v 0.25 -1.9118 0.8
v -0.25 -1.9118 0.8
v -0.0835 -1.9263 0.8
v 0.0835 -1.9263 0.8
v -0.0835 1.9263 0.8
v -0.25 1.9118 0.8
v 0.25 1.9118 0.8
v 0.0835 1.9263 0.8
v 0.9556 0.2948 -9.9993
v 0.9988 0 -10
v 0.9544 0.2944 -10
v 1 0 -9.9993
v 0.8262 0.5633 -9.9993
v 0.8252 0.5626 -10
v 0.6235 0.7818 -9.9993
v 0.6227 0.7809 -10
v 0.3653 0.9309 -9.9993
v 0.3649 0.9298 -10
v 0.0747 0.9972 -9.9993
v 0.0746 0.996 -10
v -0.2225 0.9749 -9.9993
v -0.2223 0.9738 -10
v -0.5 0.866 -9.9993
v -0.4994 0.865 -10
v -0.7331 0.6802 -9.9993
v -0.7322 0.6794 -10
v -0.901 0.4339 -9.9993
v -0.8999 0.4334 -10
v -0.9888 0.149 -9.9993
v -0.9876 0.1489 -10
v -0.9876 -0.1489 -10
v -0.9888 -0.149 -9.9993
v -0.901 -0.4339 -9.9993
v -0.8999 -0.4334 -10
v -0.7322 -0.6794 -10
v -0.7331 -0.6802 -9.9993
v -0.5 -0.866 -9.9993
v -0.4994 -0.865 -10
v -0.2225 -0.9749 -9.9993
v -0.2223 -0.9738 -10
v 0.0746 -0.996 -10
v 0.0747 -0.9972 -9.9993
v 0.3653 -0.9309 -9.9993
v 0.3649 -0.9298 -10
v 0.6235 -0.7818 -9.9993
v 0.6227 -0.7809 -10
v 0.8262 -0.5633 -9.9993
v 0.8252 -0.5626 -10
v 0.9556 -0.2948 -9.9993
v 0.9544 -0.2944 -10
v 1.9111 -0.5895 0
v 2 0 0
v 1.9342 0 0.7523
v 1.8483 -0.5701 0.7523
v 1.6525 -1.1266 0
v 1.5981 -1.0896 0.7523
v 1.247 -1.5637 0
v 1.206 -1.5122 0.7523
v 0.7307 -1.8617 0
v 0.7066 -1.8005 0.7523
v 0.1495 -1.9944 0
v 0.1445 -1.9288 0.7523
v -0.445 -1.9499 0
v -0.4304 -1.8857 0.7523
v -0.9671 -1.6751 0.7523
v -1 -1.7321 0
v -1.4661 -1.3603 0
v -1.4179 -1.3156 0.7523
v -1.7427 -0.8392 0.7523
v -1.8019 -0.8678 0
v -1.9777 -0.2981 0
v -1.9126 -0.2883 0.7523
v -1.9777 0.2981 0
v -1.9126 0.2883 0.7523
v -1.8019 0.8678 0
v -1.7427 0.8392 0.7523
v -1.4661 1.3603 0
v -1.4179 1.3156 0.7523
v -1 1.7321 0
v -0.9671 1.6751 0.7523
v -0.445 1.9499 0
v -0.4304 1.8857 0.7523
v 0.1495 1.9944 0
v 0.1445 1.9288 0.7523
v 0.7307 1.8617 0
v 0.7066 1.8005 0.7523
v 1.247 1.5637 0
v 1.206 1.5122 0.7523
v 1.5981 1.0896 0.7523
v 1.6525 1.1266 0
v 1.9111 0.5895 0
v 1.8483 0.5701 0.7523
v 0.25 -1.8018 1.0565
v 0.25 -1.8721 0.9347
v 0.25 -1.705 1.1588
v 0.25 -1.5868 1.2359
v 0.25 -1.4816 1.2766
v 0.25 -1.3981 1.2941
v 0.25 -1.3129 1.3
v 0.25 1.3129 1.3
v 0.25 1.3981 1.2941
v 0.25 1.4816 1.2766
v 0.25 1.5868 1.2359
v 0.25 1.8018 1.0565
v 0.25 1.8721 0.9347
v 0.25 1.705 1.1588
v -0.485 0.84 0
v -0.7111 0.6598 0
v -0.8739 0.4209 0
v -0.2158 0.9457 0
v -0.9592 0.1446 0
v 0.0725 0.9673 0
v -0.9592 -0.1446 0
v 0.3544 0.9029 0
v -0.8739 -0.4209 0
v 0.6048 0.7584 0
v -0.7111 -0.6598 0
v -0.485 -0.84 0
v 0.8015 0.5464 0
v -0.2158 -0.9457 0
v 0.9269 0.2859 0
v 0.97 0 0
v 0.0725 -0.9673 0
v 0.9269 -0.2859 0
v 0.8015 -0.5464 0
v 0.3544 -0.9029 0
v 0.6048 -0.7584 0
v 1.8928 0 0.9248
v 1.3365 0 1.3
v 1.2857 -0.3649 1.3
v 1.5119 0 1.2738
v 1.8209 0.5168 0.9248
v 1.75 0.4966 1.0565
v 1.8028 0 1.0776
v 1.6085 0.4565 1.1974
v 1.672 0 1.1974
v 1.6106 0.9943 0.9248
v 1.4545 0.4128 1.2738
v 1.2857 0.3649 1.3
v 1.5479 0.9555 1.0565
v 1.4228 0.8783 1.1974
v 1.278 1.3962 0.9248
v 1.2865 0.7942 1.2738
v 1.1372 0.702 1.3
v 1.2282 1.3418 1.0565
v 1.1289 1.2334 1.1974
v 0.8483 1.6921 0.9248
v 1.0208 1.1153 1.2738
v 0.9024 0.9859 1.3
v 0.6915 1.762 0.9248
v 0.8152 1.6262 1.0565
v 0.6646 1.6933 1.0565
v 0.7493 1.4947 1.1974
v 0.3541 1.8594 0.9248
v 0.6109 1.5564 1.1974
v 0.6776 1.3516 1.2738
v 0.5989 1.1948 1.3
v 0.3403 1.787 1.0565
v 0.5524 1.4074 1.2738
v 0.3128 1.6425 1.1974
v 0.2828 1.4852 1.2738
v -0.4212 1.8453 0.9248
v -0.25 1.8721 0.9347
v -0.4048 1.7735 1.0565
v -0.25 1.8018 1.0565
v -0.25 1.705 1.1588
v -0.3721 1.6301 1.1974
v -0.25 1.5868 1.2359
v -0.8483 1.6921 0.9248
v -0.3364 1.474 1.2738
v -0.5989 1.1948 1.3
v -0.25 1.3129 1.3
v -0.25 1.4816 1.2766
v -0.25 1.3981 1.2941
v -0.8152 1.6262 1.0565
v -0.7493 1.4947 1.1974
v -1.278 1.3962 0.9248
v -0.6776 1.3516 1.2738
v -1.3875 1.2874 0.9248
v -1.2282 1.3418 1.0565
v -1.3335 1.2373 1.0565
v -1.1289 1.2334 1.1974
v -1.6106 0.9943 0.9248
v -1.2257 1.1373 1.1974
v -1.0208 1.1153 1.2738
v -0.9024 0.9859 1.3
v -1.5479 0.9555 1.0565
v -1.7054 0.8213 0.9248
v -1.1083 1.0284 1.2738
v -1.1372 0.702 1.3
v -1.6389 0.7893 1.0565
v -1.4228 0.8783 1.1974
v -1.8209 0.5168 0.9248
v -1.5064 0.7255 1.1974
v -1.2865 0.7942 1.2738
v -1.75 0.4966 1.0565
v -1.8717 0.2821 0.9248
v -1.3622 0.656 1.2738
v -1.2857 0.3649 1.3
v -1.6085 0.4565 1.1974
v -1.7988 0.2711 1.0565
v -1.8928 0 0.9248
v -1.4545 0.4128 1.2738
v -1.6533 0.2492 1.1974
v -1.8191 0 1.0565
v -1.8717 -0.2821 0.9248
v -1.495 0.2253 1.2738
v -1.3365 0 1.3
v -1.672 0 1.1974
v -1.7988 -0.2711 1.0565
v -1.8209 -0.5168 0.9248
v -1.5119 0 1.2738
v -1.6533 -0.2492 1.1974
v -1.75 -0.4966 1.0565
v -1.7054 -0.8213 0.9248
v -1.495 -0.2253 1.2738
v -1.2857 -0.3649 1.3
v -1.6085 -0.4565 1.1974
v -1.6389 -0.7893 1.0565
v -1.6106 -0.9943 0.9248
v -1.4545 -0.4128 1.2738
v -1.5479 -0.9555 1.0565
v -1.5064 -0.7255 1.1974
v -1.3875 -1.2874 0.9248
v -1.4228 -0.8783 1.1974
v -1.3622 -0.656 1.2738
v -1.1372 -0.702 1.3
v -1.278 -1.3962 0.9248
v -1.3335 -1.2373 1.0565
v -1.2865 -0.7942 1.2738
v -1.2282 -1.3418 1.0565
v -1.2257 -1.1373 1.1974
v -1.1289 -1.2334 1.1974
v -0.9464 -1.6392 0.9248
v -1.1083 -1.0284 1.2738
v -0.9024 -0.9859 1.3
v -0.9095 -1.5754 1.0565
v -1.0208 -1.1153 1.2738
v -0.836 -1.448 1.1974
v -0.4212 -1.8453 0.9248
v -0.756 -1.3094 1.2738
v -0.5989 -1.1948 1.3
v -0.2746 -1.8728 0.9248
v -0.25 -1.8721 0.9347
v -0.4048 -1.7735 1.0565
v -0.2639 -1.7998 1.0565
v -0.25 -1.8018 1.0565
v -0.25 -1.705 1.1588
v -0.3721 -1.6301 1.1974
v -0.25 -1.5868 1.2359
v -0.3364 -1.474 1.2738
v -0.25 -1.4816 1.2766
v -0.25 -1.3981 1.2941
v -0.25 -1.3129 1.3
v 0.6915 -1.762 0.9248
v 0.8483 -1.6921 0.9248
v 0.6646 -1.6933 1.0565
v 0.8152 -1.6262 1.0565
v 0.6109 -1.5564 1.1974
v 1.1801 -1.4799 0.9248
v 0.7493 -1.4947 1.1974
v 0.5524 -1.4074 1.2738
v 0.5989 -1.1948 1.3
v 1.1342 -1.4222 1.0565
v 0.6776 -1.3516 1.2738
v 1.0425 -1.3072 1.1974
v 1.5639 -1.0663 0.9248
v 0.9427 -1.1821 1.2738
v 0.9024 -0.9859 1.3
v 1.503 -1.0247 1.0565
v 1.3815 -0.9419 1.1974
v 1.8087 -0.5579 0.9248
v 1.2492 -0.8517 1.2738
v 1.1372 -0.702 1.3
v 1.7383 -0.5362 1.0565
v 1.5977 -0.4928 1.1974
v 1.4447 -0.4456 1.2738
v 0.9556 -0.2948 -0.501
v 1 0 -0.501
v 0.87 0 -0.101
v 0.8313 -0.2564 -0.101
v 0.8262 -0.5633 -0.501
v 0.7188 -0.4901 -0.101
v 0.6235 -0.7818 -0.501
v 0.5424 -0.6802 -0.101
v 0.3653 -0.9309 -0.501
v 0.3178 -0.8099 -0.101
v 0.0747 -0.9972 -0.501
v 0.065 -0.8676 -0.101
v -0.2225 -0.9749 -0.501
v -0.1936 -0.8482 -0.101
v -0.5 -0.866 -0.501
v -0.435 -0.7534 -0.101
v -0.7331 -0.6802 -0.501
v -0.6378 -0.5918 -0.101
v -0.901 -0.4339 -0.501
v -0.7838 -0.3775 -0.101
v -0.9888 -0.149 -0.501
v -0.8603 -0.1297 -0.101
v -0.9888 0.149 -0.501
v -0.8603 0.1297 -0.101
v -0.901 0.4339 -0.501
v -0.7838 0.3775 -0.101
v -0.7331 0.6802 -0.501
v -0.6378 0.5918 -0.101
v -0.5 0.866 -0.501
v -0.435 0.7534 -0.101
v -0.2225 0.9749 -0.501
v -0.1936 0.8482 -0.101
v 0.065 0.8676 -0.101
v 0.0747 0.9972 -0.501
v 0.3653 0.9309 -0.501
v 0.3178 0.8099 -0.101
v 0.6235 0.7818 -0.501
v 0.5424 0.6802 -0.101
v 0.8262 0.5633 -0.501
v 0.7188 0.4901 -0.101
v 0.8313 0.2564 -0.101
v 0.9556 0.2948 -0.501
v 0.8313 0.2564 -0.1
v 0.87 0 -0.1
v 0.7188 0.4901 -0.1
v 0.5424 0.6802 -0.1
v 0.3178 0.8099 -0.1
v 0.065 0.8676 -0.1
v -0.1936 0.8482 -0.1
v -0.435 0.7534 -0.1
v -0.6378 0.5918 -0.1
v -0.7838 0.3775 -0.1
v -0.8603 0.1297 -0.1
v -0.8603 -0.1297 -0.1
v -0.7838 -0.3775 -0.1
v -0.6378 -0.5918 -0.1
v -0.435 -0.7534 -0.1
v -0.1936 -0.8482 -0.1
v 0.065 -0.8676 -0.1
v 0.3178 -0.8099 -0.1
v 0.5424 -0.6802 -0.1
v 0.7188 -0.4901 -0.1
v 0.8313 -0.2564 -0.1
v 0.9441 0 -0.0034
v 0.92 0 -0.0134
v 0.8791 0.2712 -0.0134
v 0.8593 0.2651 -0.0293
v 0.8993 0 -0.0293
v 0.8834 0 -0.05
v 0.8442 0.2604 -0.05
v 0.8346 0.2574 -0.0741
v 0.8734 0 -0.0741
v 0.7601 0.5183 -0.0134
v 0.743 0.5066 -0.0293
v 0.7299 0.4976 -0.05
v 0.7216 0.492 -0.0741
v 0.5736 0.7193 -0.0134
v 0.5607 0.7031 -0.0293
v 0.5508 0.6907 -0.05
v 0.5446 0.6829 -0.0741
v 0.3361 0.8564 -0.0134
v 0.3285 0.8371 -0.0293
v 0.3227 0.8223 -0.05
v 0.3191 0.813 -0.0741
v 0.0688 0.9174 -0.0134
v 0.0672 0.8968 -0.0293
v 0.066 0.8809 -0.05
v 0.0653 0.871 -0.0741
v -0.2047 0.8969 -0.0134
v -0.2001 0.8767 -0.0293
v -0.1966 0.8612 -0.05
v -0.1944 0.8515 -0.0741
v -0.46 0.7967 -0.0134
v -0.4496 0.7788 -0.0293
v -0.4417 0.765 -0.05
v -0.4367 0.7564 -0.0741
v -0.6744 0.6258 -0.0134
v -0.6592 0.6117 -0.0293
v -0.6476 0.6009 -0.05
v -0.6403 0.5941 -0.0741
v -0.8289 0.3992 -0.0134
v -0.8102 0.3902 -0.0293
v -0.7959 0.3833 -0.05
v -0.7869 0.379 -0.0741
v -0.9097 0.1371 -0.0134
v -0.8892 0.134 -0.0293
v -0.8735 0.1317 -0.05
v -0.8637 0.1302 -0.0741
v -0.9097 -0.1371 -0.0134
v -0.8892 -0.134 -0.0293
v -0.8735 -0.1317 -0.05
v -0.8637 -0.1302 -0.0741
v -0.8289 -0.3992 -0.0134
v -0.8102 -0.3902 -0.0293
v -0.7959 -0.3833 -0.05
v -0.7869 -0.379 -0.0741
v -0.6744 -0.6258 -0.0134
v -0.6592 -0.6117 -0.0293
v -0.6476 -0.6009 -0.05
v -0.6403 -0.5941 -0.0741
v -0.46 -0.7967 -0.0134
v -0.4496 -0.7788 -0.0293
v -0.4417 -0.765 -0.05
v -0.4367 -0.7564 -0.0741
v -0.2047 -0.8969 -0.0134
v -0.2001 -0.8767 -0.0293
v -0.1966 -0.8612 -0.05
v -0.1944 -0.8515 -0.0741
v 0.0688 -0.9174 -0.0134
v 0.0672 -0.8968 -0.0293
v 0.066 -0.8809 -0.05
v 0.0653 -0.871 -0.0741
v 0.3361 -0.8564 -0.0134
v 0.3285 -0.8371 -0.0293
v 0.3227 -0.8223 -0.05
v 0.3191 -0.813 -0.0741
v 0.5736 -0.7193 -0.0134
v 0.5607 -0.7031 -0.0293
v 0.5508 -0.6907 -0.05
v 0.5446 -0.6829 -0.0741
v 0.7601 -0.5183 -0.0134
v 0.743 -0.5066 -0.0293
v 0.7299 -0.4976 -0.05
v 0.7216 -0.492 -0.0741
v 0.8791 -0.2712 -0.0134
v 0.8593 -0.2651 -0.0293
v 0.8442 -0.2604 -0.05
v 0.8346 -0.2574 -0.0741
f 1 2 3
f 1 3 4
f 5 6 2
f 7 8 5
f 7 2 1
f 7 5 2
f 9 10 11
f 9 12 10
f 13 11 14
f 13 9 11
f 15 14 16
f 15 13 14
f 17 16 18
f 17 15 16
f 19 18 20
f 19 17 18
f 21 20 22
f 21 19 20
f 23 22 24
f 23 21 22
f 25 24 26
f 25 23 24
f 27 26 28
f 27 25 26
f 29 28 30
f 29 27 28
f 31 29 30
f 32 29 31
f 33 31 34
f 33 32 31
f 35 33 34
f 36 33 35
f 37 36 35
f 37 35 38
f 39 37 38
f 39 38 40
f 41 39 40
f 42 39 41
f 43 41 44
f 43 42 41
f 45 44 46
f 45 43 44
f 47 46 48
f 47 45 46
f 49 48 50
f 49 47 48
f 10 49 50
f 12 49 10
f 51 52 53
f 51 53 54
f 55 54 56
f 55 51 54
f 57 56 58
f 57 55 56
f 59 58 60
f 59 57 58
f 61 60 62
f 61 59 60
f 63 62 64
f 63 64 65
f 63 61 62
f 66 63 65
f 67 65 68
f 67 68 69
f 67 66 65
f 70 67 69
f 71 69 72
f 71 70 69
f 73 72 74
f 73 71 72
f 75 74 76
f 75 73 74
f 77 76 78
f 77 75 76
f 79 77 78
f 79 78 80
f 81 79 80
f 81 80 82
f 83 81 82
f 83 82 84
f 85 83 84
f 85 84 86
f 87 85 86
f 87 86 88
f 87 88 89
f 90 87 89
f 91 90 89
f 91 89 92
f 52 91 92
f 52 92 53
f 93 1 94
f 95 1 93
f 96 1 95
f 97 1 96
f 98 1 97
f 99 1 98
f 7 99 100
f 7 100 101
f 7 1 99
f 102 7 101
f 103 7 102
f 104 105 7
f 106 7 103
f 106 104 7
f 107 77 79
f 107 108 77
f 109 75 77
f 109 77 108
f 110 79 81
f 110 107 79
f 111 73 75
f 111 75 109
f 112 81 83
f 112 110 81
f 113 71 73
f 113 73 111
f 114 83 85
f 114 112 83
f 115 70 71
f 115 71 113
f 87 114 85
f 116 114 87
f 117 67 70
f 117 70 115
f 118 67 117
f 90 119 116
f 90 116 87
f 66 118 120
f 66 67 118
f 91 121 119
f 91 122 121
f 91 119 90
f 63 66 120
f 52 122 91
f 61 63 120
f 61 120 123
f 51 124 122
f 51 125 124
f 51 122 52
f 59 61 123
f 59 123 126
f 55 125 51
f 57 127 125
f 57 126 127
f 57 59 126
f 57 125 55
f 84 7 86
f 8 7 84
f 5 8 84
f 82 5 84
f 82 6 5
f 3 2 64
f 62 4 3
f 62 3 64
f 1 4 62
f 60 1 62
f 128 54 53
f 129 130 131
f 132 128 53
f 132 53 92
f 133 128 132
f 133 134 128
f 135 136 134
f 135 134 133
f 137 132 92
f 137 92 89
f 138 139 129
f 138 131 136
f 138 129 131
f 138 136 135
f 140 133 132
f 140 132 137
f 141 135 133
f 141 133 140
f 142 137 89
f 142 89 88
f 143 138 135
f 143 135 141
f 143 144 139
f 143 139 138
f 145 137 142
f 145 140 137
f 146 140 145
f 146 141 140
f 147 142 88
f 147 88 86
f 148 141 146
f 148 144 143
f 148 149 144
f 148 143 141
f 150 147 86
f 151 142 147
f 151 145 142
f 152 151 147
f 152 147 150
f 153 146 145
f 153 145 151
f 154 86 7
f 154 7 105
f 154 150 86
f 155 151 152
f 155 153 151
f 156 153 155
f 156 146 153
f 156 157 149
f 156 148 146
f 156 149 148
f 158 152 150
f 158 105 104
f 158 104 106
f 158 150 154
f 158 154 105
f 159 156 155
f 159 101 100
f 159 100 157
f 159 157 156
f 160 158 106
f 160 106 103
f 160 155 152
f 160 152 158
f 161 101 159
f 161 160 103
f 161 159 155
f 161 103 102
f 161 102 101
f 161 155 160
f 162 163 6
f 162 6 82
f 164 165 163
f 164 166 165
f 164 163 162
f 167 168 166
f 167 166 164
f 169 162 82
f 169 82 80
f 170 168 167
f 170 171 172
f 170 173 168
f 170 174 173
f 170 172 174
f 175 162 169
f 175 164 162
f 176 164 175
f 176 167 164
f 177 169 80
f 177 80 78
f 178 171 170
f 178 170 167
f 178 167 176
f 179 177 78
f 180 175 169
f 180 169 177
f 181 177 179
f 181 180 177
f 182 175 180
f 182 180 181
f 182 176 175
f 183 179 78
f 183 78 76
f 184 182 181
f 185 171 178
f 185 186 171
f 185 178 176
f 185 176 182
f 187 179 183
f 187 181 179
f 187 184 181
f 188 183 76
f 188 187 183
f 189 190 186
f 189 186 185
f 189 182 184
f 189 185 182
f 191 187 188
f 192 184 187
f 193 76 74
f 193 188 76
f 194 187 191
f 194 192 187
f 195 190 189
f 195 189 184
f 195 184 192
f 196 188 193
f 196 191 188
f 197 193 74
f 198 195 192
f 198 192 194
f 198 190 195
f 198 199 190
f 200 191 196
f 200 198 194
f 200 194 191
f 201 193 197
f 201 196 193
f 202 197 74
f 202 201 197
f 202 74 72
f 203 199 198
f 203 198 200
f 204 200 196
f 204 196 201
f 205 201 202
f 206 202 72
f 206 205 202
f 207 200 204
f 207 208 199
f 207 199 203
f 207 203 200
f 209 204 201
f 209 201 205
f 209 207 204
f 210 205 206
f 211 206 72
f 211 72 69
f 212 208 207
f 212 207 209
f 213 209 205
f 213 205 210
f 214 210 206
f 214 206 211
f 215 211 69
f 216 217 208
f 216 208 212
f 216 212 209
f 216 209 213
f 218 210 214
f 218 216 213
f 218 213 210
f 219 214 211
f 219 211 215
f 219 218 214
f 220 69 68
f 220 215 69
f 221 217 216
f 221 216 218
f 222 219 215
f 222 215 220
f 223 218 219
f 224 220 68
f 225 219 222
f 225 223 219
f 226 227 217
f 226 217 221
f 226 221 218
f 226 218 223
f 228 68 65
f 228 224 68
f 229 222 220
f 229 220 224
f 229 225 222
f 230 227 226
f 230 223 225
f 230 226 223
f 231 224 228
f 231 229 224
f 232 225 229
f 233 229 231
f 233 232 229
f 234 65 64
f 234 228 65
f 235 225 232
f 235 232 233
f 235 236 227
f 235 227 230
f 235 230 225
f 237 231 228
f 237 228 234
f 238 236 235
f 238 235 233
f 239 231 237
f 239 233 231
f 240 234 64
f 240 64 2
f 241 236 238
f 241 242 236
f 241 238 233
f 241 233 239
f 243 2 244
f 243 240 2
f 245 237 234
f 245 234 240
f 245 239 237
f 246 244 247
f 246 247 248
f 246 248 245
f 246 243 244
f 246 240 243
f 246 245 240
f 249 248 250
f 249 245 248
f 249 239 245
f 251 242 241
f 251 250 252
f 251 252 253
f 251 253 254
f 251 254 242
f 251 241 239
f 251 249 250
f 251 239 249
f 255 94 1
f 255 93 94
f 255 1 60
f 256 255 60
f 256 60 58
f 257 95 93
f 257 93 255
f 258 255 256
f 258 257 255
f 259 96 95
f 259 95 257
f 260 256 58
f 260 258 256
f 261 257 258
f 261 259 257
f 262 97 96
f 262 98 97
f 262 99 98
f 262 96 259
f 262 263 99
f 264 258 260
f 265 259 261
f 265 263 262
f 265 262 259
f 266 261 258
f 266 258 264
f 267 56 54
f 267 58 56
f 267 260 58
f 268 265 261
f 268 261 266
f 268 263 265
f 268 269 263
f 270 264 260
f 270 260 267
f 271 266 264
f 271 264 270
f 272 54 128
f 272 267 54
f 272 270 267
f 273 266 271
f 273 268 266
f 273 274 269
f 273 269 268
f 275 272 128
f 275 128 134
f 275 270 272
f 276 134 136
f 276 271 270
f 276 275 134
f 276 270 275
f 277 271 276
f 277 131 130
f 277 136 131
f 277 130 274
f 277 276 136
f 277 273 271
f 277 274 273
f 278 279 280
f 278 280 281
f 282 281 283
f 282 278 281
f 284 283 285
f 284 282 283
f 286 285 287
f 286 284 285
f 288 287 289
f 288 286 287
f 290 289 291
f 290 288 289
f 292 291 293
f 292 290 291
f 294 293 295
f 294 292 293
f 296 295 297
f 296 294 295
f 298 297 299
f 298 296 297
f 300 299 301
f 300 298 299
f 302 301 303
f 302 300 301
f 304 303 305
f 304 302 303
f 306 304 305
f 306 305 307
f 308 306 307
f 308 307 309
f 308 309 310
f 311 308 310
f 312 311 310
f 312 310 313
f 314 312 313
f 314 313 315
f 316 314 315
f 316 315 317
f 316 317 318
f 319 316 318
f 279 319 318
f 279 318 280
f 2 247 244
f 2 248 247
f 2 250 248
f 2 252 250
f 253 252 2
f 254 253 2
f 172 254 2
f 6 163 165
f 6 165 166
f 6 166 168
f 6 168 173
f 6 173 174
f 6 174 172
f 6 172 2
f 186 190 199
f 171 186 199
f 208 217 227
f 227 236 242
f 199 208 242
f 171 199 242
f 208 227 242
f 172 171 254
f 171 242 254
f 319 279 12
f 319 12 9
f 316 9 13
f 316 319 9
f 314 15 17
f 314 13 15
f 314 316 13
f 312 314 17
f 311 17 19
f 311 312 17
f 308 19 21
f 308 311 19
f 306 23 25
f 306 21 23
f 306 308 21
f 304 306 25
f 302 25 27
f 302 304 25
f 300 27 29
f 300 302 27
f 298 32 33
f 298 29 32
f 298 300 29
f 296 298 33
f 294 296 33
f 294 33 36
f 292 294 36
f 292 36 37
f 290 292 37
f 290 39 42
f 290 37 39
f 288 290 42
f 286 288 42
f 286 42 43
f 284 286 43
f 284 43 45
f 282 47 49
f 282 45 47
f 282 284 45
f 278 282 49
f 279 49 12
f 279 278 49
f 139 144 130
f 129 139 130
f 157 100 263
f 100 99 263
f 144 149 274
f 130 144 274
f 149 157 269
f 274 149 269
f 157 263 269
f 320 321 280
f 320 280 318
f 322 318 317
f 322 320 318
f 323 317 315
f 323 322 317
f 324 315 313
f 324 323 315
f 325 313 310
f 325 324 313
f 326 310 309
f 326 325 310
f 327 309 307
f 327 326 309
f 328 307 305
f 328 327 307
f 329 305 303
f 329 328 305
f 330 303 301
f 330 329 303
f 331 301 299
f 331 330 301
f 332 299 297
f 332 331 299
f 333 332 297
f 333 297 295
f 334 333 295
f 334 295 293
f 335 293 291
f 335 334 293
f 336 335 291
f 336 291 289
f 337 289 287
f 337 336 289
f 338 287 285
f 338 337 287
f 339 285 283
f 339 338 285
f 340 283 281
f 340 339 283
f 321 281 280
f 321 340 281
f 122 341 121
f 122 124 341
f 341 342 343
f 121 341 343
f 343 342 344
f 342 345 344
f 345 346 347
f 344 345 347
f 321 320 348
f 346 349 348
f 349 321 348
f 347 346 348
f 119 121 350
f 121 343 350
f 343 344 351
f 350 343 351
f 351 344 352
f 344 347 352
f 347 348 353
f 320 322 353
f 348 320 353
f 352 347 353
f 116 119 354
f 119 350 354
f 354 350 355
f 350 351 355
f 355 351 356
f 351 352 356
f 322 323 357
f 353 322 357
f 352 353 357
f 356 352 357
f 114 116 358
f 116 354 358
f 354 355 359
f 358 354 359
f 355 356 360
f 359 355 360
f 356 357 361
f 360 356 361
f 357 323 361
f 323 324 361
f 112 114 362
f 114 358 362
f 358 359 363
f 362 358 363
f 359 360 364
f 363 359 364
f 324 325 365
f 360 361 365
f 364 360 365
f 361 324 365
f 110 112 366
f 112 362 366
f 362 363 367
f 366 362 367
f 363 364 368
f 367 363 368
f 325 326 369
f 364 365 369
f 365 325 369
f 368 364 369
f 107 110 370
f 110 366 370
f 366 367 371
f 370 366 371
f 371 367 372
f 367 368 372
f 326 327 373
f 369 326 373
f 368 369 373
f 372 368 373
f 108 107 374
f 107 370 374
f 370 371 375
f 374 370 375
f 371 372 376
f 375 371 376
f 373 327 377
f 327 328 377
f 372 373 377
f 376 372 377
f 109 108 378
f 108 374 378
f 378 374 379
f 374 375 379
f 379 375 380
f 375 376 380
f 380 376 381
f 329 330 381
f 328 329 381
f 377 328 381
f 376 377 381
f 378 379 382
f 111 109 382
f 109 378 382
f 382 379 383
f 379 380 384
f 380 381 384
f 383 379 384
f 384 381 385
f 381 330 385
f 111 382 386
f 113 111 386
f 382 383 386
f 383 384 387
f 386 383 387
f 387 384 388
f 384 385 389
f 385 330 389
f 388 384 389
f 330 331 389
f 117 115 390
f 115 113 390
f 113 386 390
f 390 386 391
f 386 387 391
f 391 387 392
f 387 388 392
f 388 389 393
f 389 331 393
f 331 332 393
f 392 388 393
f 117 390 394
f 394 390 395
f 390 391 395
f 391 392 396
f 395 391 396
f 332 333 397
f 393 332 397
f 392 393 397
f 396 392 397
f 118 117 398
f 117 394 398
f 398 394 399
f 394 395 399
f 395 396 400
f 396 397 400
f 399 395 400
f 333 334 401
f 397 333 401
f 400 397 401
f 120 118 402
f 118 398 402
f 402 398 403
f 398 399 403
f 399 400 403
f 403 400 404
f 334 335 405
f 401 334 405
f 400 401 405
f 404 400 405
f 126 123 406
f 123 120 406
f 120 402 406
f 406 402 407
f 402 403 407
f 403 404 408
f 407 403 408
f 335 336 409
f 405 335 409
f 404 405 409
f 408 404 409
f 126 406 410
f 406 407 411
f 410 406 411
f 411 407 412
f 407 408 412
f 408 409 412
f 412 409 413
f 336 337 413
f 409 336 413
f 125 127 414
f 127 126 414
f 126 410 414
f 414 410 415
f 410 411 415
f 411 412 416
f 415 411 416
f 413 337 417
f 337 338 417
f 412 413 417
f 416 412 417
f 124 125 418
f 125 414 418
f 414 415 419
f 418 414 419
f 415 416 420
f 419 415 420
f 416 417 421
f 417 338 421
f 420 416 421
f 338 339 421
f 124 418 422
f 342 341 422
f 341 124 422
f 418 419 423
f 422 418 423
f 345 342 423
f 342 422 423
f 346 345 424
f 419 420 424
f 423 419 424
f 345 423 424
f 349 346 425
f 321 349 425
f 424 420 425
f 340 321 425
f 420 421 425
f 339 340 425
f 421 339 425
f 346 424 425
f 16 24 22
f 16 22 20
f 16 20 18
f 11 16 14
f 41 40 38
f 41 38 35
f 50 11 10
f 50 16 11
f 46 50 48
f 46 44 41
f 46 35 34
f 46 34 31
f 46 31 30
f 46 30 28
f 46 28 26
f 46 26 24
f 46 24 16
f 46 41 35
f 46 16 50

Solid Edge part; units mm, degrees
sketch "Sketch1" plane through (0, 0, 0) normal (0, -1, 0) x (1, 0, 0)
  line L0 (0, -10) -> (1, -10)
  line L1 (1, -10) -> (1, -0.501)
  line L2 (1, -0.501) -> (0.87, -0.101)
  line L3 (0.87, -0.101) -> (0.87, 0)
  line L4 (0.87, 0) -> (2, 0)
  line L5 (2, 0) -> (1.8863, 1.3)
  line L6 (1.8863, 1.3) -> (0, 1.3)
  dimension "D1" = 1
  dimension "D2" = 0.87
  dimension "D3" = 10
  dimension "D4" = 9.499
  dimension "D5" = 0.4
  dimension "D6" = 2
  dimension "D7" = 1.3
revolve "RevolvedProtrusion1" add sketch "Sketch1" angle 360 about axis through (0, 0, 6) along (0, 0, -1)
fillet "Round_1" radius 0.6 1 edges at (-1.8863, 0, 1.3)
sketch "Sketch2" plane through (0, 0, 0) normal (0, -1, 0) x (1, 0, 0)
  line L0 (-0.25, 1.3) -> (-0.25, 0.8)
  line L1 (-0.25, 0.8) -> (0.25, 0.8)
  line L2 (0.25, 0.8) -> (0.25, 1.3)
  line L3 (0.25, 1.3) -> (-0.25, 1.3)
  dimension "D1" = 0.5
  dimension "D2" = 0.5
  dimension "D3" = 1.3
extrude "ExtrudedCutout_1" cut sketch "Sketch2" along normal mid plane 4
cosmetic_thread "Thread_1" size "M2" thread depth 9.499
fillet "Round_2" radius 0.1 1 edges at (-0.87, 0, 0)
chamfer "Chamfer_1" distance 0.0012 angle 30 1 edges at (-1, 0, -10) measured on face at (0.6867, 0.6467, -10)
properties material "Steel"
